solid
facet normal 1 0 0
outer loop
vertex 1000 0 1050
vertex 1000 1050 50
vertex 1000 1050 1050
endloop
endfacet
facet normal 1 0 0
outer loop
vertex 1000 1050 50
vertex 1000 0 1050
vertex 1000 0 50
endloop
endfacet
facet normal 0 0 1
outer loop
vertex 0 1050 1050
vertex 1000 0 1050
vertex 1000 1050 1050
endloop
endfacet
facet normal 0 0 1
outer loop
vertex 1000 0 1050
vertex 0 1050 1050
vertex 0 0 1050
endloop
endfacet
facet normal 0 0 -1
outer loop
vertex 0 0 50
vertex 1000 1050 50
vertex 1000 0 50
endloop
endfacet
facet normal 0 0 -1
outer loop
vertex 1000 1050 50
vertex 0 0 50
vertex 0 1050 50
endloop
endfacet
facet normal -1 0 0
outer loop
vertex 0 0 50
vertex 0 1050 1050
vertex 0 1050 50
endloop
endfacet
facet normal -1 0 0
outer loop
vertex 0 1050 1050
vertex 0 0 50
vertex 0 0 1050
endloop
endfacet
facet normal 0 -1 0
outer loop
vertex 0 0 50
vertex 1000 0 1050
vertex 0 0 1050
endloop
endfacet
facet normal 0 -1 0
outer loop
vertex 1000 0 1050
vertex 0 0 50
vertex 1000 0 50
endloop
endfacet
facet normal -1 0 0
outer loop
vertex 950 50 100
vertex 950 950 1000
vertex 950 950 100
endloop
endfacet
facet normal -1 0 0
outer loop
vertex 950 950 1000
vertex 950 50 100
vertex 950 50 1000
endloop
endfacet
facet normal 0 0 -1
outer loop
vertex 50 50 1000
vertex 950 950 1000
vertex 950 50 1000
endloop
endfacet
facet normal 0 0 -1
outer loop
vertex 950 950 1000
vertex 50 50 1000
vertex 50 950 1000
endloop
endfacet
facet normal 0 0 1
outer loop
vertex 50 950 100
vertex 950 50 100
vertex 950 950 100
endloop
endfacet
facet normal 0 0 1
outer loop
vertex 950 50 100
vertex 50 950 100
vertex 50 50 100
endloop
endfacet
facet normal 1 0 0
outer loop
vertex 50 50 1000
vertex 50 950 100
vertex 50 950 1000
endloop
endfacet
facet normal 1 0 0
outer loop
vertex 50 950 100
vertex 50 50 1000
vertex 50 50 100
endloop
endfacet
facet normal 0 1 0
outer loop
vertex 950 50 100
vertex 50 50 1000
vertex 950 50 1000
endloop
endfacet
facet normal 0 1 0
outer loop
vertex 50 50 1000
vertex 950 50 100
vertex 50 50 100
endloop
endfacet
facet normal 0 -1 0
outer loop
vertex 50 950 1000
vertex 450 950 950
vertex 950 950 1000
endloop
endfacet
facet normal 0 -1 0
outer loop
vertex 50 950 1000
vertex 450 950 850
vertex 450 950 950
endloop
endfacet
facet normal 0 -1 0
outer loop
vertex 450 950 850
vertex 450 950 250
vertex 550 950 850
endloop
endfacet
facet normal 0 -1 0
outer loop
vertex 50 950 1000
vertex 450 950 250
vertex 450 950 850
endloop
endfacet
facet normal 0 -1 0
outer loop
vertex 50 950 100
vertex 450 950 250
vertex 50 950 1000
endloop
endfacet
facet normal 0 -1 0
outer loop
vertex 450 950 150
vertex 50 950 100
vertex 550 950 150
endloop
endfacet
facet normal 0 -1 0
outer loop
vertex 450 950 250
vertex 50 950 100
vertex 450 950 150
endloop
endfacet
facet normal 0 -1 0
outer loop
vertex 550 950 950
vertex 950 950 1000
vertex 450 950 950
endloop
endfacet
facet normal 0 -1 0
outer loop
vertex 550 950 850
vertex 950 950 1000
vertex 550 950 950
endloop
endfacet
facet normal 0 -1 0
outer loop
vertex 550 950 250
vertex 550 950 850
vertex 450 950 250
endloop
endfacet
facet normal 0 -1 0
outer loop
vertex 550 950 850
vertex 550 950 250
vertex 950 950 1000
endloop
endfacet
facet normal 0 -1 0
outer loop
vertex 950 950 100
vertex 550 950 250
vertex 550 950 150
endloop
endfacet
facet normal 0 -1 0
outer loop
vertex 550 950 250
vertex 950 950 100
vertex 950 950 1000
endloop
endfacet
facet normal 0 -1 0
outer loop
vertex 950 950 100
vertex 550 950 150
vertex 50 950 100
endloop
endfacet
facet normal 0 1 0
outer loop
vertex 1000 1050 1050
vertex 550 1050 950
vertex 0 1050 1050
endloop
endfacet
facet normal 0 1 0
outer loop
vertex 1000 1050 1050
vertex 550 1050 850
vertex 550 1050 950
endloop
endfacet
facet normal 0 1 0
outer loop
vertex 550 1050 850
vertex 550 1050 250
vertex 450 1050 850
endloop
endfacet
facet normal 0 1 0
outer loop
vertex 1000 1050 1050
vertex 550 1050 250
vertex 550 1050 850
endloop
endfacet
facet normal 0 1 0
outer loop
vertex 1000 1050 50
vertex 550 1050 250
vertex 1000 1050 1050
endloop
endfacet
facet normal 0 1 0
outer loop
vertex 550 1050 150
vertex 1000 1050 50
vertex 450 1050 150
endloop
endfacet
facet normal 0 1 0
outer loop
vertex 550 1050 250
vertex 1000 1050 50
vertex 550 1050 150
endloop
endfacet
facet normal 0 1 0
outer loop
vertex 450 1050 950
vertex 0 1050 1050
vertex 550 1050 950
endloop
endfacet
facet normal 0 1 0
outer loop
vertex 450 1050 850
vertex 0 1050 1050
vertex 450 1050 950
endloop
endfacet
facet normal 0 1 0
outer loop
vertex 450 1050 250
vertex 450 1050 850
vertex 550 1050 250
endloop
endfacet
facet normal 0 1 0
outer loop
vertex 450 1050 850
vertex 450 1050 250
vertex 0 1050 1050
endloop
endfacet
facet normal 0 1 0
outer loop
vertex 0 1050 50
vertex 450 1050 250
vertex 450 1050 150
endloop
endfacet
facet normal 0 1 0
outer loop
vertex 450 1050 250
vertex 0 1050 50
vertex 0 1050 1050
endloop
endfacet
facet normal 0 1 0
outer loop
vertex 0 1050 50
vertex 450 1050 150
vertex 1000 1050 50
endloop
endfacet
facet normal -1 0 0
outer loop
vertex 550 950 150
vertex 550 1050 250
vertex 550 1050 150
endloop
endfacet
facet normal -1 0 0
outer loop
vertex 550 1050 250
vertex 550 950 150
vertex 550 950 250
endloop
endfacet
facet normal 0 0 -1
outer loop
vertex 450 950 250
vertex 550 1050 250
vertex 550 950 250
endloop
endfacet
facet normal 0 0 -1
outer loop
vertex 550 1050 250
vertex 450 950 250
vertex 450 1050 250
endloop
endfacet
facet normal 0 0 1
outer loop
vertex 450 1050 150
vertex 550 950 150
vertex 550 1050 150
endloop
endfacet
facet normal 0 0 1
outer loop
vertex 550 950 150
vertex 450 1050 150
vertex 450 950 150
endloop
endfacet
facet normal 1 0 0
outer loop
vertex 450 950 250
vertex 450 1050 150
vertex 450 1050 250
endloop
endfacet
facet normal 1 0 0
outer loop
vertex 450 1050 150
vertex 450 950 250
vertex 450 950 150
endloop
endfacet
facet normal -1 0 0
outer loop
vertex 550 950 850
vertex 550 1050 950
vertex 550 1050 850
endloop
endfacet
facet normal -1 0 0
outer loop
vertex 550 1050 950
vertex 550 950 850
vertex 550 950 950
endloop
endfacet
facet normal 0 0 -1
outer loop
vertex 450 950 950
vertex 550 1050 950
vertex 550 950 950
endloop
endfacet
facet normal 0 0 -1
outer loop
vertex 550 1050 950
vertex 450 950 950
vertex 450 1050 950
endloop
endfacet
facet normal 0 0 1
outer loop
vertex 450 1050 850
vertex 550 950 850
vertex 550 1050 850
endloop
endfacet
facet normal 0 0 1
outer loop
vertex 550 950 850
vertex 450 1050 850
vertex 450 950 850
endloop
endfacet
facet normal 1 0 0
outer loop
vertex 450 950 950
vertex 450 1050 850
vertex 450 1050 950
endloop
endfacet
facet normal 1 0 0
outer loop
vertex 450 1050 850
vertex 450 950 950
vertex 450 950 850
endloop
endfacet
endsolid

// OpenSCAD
//
// Refricat
// A cat climatization system
//

mm = 1.0;
cm = 10*mm;
m  = 100*cm;

fridgel=1*m;
fridgeL=1*m;
fridgeh=1*m;
fridgeW=5*cm;
insulationW=5*cm;
ventilationW=5*cm;



module fridge_body() {
    color([.8,.8,.8])
    difference() {
        cube([fridgel,fridgeL,fridgeh]);
        translate([fridgeW,fridgeW,fridgeW])
        cube([fridgel-2*fridgeW,fridgeL+2*fridgeW,fridgeh-2*fridgeW]);
    }
}

/*
module fridge_door() {
    color([.8,.7,.2])
    translate([fridgeW,fridgeL-insulationW,fridgeW])
    difference() {
        union() {
            cube([fridgel-2*fridgeW,insulationW,fridgeh-2*fridgeW]);
            translate([-insulationW,insulationW,-insulationW])
            cube([fridgel,insulationW,fridgeh]);
        };
        union {
            cube([ventilationW,ventilationW,ventilationW]);
        };
    }
}
*/

module fridge_door() {
    color([.8,.7,.2])
    translate([fridgeW,fridgeL-insulationW,fridgeW])
    difference() {
        union() {
            cube([fridgel-2*fridgeW,insulationW,fridgeh-2*fridgeW]);
            translate([-insulationW,insulationW,-insulationW])
            cube([fridgel,insulationW,fridgeh]);
        };
        translate([fridgel/2-2*insulationW,-insulationW,fridgeW])
        cube([ventilationW*2,4*insulationW,ventilationW*2]);
        translate([ fridgel/2-2*insulationW,
                   -insulationW,
                    fridgeh-fridgeW-4*ventilationW])
        cube([ventilationW*2,4*insulationW,ventilationW*2]);
   }
}

module fridge() {
    union() {
       fridge_body();
       fridge_door();
    }
}

union() {
    translate([0,0,insulationW]) fridge();
}
